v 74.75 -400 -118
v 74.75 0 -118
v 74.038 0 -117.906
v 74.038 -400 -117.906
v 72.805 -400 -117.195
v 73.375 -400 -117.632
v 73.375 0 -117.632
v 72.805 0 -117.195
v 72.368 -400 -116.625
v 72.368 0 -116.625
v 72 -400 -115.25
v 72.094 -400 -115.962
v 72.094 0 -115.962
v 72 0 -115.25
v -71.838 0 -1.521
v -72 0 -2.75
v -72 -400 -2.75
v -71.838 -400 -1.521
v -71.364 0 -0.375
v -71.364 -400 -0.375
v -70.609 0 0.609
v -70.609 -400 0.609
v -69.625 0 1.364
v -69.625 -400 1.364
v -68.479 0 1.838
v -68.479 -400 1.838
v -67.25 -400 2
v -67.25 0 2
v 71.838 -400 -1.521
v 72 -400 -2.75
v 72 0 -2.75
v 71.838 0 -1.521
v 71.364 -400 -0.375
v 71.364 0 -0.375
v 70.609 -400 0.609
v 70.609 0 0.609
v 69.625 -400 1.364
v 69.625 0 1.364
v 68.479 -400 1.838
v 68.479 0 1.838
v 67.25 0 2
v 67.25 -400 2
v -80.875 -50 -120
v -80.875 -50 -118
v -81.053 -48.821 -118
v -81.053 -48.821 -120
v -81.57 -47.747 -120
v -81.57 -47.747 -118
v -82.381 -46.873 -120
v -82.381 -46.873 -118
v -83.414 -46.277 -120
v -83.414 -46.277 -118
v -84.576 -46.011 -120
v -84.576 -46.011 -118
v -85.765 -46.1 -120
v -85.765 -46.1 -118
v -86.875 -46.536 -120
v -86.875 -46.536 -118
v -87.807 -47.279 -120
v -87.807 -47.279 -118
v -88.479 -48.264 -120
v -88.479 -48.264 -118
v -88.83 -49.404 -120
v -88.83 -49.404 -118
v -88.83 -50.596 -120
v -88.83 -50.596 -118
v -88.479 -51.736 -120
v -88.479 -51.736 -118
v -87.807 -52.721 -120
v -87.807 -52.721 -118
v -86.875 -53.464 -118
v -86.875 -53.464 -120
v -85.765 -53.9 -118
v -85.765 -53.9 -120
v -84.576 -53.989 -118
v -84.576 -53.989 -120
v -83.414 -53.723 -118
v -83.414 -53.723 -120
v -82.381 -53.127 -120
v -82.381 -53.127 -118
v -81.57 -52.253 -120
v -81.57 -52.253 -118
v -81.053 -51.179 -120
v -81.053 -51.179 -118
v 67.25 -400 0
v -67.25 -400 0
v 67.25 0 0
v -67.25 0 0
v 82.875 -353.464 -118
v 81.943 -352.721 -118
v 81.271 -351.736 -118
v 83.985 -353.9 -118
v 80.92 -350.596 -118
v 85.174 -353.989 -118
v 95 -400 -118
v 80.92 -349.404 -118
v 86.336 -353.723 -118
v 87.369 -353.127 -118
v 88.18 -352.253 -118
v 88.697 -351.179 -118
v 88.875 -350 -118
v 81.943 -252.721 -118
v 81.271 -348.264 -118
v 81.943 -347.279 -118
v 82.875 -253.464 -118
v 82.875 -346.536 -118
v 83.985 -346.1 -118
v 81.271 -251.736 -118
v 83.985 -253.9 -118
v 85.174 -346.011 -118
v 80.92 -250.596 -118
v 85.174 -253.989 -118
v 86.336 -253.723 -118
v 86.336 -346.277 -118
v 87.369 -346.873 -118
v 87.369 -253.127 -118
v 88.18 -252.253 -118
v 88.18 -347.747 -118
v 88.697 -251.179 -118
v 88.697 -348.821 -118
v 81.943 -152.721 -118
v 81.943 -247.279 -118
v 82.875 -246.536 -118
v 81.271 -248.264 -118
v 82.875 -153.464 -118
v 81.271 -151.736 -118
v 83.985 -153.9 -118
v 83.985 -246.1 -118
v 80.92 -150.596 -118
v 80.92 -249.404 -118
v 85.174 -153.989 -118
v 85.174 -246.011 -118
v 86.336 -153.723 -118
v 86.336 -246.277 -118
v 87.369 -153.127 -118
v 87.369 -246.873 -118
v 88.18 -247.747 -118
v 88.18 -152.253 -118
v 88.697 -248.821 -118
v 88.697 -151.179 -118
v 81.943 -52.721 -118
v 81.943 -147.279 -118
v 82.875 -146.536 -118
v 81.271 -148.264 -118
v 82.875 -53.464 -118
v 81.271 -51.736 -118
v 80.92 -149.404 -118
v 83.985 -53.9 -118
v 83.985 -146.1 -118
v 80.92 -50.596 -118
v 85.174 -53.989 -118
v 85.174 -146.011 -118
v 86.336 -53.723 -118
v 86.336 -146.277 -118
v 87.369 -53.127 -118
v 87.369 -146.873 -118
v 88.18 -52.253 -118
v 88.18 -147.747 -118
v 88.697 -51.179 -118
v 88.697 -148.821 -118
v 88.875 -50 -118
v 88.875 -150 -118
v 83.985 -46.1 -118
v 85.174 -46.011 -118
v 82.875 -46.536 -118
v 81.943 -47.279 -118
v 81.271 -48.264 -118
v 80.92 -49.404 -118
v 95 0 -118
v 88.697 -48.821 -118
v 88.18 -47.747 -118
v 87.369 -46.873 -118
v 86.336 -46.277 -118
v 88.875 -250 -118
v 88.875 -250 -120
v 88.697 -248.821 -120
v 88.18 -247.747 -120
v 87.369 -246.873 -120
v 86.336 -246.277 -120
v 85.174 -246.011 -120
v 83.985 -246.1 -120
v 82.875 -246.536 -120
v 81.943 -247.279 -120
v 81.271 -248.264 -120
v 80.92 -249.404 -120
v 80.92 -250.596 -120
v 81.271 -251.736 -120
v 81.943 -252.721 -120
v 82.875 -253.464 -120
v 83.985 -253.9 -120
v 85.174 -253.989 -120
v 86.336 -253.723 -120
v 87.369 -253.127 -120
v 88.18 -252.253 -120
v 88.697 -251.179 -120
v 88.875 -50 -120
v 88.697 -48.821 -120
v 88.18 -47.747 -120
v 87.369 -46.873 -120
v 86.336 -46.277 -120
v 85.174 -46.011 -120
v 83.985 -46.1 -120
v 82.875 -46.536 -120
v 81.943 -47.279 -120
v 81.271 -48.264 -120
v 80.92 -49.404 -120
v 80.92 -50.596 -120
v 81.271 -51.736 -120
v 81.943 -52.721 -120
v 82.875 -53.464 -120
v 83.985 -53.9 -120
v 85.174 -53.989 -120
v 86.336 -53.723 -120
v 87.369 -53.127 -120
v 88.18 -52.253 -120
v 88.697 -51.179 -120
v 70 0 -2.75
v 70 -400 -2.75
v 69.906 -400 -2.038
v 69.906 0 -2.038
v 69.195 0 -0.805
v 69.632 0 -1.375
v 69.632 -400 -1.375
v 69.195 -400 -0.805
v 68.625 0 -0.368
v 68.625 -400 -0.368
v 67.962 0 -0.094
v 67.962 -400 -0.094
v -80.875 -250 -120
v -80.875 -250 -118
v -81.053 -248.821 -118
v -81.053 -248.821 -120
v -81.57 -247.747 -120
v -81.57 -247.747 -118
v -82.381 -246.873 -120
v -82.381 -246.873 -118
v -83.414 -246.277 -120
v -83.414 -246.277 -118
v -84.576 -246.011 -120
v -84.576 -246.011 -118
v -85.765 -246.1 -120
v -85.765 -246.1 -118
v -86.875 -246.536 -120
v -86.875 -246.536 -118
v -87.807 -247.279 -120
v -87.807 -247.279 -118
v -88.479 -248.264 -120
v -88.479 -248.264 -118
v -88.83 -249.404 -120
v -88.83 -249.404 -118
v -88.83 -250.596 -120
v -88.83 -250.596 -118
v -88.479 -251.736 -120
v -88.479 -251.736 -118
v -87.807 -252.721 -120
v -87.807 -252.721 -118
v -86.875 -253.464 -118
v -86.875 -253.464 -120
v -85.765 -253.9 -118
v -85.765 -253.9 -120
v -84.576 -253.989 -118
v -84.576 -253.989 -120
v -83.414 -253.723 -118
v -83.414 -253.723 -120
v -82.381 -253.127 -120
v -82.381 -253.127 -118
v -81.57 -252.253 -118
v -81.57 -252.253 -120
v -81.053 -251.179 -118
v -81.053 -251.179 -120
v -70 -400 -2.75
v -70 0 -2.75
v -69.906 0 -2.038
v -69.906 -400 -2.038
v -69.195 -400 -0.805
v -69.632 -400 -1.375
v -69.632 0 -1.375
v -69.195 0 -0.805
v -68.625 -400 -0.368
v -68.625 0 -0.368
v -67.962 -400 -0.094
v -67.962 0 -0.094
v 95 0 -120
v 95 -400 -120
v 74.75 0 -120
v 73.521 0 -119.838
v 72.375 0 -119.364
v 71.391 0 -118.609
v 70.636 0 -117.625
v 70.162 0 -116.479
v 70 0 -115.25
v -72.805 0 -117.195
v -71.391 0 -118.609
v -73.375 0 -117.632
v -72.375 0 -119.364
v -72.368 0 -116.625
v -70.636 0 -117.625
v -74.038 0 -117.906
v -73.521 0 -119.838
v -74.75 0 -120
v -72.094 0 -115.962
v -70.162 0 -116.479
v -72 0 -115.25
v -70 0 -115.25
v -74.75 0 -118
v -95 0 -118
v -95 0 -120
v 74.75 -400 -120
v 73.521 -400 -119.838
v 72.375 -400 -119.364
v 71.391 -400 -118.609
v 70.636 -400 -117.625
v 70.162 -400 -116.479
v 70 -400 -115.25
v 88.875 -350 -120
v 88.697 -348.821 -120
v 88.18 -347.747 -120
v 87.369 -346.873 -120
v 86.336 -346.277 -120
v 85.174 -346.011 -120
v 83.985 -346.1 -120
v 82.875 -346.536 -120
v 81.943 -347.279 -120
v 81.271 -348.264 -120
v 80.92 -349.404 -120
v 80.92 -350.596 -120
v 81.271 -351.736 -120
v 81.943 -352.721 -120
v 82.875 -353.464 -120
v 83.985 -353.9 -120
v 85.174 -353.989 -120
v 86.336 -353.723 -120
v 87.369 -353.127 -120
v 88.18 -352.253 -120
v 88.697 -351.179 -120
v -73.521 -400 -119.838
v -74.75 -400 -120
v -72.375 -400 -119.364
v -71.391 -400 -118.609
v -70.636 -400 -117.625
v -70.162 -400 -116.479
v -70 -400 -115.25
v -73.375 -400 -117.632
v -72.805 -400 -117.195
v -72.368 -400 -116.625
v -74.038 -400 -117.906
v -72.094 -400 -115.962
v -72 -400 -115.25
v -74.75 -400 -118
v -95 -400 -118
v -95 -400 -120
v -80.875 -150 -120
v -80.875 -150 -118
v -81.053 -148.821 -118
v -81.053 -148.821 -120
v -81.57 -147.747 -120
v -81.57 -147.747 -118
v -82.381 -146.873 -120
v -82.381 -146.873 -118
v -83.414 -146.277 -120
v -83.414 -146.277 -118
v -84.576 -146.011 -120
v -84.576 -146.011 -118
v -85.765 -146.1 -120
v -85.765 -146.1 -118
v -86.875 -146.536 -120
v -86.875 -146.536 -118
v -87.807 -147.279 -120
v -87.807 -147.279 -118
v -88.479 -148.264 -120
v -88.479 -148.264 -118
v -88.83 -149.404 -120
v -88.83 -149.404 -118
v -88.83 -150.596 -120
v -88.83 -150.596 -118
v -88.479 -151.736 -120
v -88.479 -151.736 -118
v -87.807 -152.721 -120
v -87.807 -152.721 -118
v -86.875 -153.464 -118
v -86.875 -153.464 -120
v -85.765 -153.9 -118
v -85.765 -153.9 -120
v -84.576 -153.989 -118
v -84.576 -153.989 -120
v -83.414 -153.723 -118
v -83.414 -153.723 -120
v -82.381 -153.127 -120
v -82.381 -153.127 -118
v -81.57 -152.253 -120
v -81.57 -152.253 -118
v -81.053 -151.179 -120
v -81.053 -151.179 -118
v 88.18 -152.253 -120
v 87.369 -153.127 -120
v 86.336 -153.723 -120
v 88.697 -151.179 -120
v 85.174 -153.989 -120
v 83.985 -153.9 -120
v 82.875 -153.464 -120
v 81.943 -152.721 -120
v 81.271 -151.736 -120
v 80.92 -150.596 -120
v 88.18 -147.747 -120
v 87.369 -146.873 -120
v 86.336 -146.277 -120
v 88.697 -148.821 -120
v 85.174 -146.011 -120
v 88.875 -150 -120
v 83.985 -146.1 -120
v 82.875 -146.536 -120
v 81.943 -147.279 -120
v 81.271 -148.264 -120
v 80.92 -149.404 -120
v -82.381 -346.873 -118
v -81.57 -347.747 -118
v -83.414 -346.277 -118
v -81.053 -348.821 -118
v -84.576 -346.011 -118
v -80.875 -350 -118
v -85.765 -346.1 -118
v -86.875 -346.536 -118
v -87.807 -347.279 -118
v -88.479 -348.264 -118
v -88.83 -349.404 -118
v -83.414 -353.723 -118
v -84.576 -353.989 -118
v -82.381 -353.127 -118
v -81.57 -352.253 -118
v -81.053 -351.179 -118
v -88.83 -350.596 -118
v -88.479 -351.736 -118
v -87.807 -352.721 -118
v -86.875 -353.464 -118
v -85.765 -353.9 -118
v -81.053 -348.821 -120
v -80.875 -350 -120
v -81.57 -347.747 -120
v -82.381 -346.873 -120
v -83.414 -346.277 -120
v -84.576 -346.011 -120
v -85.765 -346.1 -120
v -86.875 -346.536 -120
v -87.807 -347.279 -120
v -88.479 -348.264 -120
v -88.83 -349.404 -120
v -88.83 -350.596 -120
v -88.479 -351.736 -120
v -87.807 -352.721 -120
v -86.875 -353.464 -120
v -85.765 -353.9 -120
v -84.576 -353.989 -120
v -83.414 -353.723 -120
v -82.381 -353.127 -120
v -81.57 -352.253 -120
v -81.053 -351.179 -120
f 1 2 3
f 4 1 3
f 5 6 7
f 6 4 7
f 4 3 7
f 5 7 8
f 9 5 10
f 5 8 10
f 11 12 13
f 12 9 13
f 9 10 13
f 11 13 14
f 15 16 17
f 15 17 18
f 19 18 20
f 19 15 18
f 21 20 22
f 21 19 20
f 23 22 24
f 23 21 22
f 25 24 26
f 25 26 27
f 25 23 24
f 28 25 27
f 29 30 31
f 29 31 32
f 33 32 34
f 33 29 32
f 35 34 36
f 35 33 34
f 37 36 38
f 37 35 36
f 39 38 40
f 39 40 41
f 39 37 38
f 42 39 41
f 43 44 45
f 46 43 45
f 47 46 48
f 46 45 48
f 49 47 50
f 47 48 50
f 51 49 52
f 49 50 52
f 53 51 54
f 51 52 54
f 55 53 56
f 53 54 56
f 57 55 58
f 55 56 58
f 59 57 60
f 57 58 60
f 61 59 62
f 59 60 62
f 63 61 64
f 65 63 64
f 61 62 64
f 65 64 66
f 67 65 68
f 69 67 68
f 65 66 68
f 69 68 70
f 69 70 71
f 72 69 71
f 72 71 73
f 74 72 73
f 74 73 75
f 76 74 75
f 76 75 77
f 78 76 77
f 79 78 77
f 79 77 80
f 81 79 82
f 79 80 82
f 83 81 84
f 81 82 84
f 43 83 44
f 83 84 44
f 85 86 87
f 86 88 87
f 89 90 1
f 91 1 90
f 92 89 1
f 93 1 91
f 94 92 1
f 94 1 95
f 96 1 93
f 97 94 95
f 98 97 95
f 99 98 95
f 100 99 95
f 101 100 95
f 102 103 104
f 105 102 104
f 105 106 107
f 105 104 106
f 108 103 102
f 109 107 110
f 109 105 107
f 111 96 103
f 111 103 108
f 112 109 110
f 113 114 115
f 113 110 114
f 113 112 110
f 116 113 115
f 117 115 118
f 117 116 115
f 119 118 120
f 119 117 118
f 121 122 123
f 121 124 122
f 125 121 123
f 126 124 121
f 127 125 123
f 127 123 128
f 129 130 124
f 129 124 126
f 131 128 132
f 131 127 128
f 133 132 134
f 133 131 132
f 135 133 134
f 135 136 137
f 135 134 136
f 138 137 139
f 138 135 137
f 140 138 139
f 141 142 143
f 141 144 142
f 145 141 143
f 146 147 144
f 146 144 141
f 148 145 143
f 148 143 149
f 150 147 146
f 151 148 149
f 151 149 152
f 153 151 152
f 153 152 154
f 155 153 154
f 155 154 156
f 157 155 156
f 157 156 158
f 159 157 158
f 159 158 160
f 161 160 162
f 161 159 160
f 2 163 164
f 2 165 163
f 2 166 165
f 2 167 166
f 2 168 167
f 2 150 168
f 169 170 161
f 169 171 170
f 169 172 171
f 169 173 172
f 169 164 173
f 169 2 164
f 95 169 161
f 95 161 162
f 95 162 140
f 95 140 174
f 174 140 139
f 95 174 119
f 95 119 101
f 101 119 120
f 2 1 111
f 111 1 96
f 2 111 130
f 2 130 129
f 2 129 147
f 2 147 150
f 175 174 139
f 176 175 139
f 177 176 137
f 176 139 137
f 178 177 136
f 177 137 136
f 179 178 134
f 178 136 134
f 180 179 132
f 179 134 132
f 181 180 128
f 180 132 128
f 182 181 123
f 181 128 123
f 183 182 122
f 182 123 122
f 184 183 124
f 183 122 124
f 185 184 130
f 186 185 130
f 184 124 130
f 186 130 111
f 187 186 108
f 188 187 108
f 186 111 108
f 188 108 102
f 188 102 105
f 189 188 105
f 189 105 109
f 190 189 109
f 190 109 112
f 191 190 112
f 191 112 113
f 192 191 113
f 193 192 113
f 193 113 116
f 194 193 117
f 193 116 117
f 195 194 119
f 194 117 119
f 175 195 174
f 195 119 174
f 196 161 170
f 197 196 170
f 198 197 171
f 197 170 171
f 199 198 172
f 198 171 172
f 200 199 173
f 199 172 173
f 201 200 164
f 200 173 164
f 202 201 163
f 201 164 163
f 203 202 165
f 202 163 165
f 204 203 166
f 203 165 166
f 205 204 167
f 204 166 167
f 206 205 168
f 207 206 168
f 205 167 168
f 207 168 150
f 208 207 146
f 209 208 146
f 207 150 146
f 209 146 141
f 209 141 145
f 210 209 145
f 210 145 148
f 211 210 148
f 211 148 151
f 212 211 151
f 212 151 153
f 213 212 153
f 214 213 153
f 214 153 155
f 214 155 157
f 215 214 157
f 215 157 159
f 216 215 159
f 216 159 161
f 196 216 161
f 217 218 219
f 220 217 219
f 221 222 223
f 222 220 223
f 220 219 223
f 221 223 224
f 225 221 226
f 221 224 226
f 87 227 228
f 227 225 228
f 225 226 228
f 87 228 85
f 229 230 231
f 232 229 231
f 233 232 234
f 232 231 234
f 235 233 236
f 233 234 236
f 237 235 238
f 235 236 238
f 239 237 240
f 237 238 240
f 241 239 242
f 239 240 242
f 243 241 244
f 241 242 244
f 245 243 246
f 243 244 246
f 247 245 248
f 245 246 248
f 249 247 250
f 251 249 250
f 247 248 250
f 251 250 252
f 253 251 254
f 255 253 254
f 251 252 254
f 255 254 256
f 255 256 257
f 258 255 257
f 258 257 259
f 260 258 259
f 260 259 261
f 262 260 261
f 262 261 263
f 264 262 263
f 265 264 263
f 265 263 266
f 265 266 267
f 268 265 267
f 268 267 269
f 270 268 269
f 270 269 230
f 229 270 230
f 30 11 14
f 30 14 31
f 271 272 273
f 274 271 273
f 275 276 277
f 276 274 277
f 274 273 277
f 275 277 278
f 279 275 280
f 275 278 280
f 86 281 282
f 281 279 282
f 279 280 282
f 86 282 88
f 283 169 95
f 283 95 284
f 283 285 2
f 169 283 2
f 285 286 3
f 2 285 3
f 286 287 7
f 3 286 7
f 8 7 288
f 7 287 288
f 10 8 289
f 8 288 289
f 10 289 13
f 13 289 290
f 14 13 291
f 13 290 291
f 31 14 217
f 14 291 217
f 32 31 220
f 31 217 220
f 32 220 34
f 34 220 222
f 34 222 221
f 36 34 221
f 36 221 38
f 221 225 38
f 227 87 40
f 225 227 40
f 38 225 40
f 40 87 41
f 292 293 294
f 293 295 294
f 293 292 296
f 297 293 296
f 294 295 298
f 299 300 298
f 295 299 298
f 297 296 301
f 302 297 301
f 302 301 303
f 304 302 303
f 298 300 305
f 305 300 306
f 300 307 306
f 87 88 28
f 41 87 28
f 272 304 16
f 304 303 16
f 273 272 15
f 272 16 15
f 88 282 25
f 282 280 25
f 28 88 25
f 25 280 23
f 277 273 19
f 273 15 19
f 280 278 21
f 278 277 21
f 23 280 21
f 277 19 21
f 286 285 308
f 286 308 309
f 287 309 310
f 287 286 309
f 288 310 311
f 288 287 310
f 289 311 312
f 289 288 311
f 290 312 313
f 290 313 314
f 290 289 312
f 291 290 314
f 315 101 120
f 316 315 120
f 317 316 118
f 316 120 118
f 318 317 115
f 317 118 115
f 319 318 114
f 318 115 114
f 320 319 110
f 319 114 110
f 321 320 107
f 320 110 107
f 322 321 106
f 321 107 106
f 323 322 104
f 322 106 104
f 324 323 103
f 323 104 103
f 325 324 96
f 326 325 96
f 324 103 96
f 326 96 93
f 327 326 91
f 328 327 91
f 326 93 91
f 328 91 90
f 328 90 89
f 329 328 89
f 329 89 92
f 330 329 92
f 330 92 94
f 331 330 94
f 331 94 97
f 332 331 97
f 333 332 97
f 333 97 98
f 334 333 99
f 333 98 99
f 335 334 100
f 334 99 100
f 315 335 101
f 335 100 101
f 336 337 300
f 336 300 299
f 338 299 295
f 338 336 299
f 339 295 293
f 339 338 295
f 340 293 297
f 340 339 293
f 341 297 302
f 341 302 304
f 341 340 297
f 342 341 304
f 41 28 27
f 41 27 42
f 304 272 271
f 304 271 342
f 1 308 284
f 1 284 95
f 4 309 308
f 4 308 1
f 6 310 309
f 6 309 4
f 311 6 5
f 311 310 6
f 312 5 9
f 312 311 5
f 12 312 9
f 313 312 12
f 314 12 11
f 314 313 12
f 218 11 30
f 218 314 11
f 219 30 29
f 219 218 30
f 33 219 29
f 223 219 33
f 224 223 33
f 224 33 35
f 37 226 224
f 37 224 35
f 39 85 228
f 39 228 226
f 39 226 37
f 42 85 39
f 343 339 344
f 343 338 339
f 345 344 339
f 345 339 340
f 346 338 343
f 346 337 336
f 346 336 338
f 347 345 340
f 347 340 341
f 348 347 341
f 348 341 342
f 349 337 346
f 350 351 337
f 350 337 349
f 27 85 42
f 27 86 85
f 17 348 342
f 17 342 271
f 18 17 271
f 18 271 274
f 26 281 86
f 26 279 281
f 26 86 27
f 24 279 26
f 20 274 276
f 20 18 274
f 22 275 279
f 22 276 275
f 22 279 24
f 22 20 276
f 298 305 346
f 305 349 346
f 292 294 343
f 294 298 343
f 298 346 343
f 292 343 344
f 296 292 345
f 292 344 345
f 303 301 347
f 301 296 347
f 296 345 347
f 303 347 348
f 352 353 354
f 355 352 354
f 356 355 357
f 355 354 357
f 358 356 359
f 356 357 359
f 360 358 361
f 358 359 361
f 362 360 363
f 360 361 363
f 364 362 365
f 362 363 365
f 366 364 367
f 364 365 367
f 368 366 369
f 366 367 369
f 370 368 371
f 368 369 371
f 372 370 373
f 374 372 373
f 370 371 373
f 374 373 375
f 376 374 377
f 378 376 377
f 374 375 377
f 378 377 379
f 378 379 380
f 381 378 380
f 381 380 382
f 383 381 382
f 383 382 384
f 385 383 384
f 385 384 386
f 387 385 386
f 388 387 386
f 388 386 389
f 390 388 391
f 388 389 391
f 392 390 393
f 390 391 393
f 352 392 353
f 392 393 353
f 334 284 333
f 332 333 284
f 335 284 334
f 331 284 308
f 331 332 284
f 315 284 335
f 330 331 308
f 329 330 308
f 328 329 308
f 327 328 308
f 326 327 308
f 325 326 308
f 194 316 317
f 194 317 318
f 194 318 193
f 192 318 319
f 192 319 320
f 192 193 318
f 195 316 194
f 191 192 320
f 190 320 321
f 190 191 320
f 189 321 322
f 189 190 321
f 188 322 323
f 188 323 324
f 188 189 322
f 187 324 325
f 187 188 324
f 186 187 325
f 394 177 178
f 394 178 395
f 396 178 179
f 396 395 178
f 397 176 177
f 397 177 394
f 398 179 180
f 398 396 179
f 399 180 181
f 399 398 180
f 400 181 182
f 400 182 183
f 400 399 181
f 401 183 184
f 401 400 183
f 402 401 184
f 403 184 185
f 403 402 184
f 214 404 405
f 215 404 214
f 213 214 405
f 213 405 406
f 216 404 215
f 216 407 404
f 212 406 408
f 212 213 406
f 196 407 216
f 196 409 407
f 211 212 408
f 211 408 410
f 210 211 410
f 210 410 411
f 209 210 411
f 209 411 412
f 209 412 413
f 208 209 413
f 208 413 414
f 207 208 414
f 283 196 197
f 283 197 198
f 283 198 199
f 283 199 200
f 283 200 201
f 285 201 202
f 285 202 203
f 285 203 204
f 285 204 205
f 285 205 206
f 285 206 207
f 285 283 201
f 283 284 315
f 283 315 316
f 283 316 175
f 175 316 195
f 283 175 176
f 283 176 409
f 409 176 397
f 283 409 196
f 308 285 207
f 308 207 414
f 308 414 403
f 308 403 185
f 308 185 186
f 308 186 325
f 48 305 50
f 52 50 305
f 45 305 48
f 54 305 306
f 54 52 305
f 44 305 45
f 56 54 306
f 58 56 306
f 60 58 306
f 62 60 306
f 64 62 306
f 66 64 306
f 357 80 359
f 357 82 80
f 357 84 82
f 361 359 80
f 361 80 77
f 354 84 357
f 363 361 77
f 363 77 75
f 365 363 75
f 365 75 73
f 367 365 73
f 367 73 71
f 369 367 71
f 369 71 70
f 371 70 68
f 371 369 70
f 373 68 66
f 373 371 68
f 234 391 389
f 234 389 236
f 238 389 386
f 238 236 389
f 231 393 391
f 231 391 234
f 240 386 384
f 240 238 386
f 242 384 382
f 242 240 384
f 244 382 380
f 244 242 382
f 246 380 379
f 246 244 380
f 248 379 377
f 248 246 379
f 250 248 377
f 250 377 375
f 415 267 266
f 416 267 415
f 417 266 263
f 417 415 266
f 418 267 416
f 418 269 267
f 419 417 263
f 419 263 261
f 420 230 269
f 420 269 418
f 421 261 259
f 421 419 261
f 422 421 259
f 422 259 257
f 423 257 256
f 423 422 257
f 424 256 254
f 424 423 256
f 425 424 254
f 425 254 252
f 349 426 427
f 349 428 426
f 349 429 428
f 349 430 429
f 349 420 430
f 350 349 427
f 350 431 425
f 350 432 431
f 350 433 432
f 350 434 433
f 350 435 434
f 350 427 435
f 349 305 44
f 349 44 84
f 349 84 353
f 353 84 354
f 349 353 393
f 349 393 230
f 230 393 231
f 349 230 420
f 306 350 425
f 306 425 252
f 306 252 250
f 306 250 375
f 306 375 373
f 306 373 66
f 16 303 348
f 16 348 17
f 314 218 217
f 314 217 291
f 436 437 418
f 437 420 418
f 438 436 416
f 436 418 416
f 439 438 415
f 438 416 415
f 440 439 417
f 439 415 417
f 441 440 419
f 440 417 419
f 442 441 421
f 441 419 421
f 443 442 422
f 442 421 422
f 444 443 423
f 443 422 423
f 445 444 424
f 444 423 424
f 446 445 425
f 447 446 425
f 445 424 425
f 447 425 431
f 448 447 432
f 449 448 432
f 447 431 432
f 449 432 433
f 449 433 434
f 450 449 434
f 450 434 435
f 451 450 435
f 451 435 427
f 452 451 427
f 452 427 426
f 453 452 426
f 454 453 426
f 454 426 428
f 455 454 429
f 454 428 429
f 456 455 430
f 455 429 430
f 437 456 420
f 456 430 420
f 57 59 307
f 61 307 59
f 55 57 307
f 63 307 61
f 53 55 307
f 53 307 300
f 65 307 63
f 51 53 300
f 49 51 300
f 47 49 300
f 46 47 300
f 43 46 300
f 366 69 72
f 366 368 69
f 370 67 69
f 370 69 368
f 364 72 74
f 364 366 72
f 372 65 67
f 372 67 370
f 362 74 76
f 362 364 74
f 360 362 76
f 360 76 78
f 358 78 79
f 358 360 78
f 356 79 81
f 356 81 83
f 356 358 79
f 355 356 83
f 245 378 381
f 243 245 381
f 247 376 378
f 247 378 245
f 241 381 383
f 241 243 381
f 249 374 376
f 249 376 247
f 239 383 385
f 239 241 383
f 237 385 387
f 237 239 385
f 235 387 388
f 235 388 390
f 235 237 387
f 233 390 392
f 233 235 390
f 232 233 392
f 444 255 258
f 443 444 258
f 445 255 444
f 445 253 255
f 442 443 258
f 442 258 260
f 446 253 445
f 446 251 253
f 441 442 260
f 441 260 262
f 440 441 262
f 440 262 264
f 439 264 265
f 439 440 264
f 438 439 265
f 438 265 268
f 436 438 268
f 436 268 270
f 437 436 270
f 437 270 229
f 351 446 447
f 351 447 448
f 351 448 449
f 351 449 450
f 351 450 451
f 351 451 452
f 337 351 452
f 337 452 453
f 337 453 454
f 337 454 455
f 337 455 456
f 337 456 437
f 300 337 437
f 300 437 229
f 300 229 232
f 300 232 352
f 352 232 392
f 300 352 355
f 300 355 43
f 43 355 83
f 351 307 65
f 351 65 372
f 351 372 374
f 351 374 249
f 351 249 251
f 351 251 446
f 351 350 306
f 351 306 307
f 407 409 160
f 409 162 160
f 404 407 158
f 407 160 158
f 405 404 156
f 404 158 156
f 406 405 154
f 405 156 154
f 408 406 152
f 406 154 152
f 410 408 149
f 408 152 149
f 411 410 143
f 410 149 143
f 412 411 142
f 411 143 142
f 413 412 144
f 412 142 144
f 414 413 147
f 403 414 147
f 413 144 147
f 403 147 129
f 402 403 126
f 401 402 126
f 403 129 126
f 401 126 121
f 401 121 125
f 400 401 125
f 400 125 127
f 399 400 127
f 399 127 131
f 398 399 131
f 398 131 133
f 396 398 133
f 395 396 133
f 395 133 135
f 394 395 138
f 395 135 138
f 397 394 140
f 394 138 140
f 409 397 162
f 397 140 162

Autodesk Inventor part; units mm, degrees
ref_plane "YZ Plane" through (0, 0, 0) normal (1, 0, 0) x (0, 1, 0)
ref_plane "XZ Plane" through (0, 0, 0) normal (0, 1, 0) x (-1, 0, 0)
ref_plane "XY Plane" through (0, 0, 0) normal (0, 0, 1) x (1, 0, 0)
sketch "Sketch1" plane through (0, 0, 0) normal (0, 0, 1) x (1, 0, 0)
  line L0 (-70, 0) -> (70, 0)
  line L1 (70, 0) -> (70, -400)
  line L2 (70, -400) -> (-70, -400)
  line L3 (-70, -400) -> (-70, 0)
  point P0 (0, 0)
  point P1 (0, 0)
  dimension "d0" = 140
  dimension "d1" = 400
extrude "Plate1" add sketch "Sketch1" along normal blind 2
sketch "Sketch2" plane through (72, -400, 2) normal (-1, 0, 0) x (0, -1, 0)
  line L0 (-400, 0) -> (0, 0)
  line L1 (0, 0) -> (0, -120)
  line L2 (0, -120) -> (-400, -120)
  line L3 (-400, -120) -> (-400, 0)
edge flange "Flange1" height 120 angle 90 thickness 2 bend radius 2.75 thickness toward (-1, 0, 0) relief round relief width 2 relief depth 1 edges at (70, -200, 0) wall of the first edge with corners at (72, 0, 2) (72, -400, 2) (72, -400, -118) (72, 0, -118)
bend "Bend1"
corner "Corner1"
sketch "Sketch3" plane through (-72, 0, 2) normal (1, 0, 0) x (0, 1, 0)
  line L0 (-400, 0) -> (0, 0)
  line L1 (0, 0) -> (0, -120)
  line L2 (0, -120) -> (-400, -120)
  line L3 (-400, -120) -> (-400, 0)
edge flange "Flange2" height 120 angle 90 thickness 2 bend radius 2.75 thickness toward (1, 0, 0) relief round relief width 2 relief depth 1 edges at (-70, -200, 0) wall of the first edge with corners at (-72, -400, 2) (-72, 0, 2) (-72, 0, -118) (-72, -400, -118)
bend "Bend2"
corner "Corner2"
sketch "Sketch4" plane through (70, 0, -120) normal (0, 0, 1) x (1, 0, 0)
  line L0 (0, -400) -> (0, 0)
  line L1 (0, 0) -> (25, 0)
  line L2 (25, 0) -> (25, -400)
  line L3 (25, -400) -> (0, -400)
edge flange "Flange3" height 25 angle 90 thickness 2 bend radius 2.75 thickness toward (0, 0, 1) relief round relief width 2 relief depth 1 edges at (72, -200, -118) wall of the first edge with corners at (70, -400, -120) (70, 0, -120) (95, 0, -120) (95, -400, -120)
bend "Bend3"
corner "Corner3"
sketch "Sketch5" plane through (-70, -400, -120) normal (0, 0, 1) x (1, 0, 0)
  line L0 (0, 400) -> (0, 0)
  line L1 (0, 0) -> (-25, 0)
  line L2 (-25, 0) -> (-25, 400)
  line L3 (-25, 400) -> (0, 400)
edge flange "Flange4" height 25 angle 90 thickness 2 bend radius 2.75 thickness toward (0, 0, 1) relief round relief width 2 relief depth 1 edges at (-72, -200, -118) wall of the first edge with corners at (-70, 0, -120) (-70, -400, -120) (-95, -400, -120) (-95, 0, -120)
bend "Bend4"
corner "Corner4"
sketch "Sketch6" plane through (95, -400, -118) normal (0, 0, 1) x (1, 0, 0)
  circle A0 centre (-10.125, 350) radius 4
  line L0 (-20.25, 400) -> (0, 400) projected
  point P0 (-95, 400)
  point P1 (-10.125, 400)
  dimension "d43" = 8
  dimension "d44" = 50
extrude "Extrusion1" cut sketch "Sketch6" against normal through all
pattern_linear "Rectangular Pattern2" count 4 spacing 100 along (0, -1, 0) count 2 spacing 169.75 along (-1, 0, 0) of "Extrusion1"
equation "\"d0\" = Ширина_крепления_корпуса"
equation "\"d1\" = Длина_базовой_пластины"
equation "\"d2\" = Thickness"
equation "\"d3\" = BendReliefWidth"
equation "\"d4\" = BendReliefDepth"
equation "\"d5\" = MinimumRemnant"
equation "\"d6\" = TransitionRadius"
equation "\"d7\" = Длина_крепления_корпуса"
equation "\"d9\" = BendRadius"
equation "\"d10\" = CornerReliefSize"
equation "\"d11\" = GapSize"
equation "\"d12\" = JacobiRadiusSize"
equation "\"d13\" = BendReliefWidth"
equation "\"d14\" = BendReliefDepth"
equation "\"d15\" = MinimumRemnant"
equation "\"d16\" = TransitionRadius"
equation "\"d17\" = Длина_крепления_корпуса"
equation "\"d19\" = BendRadius"
equation "\"d20\" = CornerReliefSize"
equation "\"d21\" = GapSize"
equation "\"d22\" = JacobiRadiusSize"
equation "\"d23\" = BendReliefWidth"
equation "\"d24\" = BendReliefDepth"
equation "\"d25\" = MinimumRemnant"
equation "\"d26\" = TransitionRadius"
equation "\"d29\" = BendRadius"
equation "\"d30\" = CornerReliefSize"
equation "\"d31\" = GapSize"
equation "\"d32\" = JacobiRadiusSize"
equation "\"d33\" = BendReliefWidth"
equation "\"d34\" = BendReliefDepth"
equation "\"d35\" = MinimumRemnant"
equation "\"d36\" = TransitionRadius"
equation "\"d39\" = BendRadius"
equation "\"d40\" = CornerReliefSize"
equation "\"d41\" = GapSize"
equation "\"d42\" = JacobiRadiusSize"
equation "\"BendReliefWidth\" = Thickness"
equation "\"BendReliefDepth\" = 0.5 * Thickness"
equation "\"CornerReliefSize\" = 4 * Thickness"
equation "\"MinimumRemnant\" = 2 * Thickness"
equation "\"TransitionRadius\" = BendRadius"
equation "\"JacobiRadiusSize\" = BendRadius"
equation "\"GapSize\" = Thickness"
equation "\"Ширина_крепления_корпуса\" = 140"
equation "\"Длина_базовой_пластины\" = 400"
equation "\"Thickness\" = 2"
equation "\"Длина_крепления_корпуса\" = 120"
equation "\"BendRadius\" = 2.75"
properties part number "Кожух" material "Stainless Steel"
